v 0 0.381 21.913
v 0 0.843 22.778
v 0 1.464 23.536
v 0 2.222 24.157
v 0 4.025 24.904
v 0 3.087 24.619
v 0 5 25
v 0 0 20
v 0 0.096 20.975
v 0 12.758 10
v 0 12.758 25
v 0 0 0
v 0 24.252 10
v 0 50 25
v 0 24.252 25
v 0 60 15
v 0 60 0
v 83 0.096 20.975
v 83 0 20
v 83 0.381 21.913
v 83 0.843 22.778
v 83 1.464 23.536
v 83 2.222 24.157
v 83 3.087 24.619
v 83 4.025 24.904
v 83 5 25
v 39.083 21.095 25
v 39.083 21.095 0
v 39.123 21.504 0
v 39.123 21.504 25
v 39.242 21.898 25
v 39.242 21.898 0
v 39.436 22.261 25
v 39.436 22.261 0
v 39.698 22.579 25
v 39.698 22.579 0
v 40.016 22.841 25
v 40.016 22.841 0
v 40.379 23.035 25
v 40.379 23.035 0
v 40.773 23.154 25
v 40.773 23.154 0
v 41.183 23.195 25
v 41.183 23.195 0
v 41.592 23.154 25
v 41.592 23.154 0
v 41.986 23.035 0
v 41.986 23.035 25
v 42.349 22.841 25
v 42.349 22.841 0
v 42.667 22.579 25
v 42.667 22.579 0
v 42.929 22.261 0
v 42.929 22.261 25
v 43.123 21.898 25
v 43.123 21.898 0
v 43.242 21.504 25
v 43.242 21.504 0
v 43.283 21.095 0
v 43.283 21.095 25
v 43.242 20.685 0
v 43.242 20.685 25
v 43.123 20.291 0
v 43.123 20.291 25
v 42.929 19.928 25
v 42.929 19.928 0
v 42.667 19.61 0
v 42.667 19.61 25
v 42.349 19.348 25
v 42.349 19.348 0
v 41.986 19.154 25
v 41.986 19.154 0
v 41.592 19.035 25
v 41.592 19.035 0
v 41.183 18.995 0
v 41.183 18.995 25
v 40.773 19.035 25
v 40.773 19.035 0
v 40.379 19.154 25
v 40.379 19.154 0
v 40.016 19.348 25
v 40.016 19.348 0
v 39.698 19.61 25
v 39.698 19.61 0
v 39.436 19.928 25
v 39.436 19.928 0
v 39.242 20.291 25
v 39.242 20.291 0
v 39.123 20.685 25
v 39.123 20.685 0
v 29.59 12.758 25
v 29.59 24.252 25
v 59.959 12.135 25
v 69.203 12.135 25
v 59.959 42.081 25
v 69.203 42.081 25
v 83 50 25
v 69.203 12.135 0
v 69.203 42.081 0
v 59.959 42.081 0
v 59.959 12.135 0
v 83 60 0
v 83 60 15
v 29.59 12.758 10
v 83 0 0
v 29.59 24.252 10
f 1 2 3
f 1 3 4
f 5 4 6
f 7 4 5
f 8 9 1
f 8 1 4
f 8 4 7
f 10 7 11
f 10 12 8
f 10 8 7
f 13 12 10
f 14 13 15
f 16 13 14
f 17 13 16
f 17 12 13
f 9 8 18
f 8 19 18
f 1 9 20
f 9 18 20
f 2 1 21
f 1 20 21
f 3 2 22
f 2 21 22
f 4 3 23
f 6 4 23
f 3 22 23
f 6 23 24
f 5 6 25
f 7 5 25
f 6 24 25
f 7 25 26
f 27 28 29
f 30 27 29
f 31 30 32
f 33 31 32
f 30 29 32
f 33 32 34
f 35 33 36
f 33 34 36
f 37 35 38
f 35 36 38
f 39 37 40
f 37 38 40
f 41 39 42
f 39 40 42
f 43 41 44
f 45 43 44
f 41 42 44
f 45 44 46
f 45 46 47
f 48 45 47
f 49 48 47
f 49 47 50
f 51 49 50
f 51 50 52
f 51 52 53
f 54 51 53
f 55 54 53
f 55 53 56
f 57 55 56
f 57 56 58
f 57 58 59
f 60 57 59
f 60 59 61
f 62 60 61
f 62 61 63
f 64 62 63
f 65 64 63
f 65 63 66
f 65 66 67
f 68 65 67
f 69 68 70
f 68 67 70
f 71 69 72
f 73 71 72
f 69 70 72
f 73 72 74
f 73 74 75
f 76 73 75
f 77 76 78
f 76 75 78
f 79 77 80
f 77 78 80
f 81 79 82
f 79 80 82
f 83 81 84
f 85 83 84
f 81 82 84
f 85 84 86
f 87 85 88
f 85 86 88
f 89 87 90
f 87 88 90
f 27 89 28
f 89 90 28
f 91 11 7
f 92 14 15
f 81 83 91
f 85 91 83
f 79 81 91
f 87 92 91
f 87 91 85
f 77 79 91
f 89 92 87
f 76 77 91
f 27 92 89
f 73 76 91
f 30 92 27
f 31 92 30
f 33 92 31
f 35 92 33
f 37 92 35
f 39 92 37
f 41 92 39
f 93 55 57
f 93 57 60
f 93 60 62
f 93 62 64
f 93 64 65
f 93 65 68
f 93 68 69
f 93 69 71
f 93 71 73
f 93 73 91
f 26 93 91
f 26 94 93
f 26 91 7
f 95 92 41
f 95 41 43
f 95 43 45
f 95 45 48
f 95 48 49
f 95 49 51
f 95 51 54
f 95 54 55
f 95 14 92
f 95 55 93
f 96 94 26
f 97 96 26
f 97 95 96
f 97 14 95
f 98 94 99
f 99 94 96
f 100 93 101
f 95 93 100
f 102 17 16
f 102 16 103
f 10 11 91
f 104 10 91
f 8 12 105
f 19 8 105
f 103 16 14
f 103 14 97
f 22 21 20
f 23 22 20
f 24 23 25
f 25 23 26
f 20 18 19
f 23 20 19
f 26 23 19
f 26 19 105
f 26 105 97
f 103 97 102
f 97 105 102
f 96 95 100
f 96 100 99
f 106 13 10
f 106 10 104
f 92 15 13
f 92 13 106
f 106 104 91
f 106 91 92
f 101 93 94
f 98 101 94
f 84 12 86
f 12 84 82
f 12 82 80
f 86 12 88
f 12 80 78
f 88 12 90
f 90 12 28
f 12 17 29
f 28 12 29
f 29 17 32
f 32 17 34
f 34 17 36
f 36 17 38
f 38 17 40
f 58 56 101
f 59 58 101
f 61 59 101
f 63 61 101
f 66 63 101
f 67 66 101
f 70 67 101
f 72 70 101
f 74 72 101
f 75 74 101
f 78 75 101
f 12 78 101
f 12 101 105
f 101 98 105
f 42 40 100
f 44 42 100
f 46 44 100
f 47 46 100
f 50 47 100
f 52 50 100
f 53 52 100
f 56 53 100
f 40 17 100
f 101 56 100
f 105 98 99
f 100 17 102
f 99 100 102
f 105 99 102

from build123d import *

# Parameters (mm, degrees)
F0_W     = 83
F0_H     = 60
F1_DEPTH = 25
F2_R     = 5
F3_SIZE  = 10
F5_D     = 4.2
F6_W     = 9.244158864
F6_H     = 29.9456948414
F7_DEPTH = 30
F8_W     = 29.5899156481
F8_H     = 11.4948265254
F9_DEPTH = 15


with BuildPart() as f1:
    # F0 (on Top) → F1 (new body)
    with BuildSketch(Plane.XY):
        with Locations((41.5, 30)):
            Rectangle(F0_W, F0_H)
    extrude(amount=F1_DEPTH)

    # F2
    f2_edges = [f1.edges().sort_by_distance(p)[0] for p in [
        (41.5, 0, 25),
    ]]
    fillet(f2_edges, radius=F2_R)

    # F3
    f3_edges = [f1.edges().sort_by_distance(p)[0] for p in [
        (41.5, 60, 25),
    ]]
    chamfer(f3_edges, length=F3_SIZE)

    # F5 (through all)
    with Locations(Plane.XY.offset(25)):
        with Locations((41.1825105548, 21.0945475847)):
            Hole(F5_D / 2)

    # F6 (on face) → F7 (cut)
    with BuildSketch(Plane.XY.offset(25)):
        with Locations((64.5809471607, 27.1079088561)):
            Rectangle(F6_W, F6_H)
    extrude(amount=-F7_DEPTH, mode=Mode.SUBTRACT)

    # F8 (on face) → F9 (cut)
    with BuildSketch(Plane.XY.offset(25)):
        with Locations((14.7949578241, 18.5050182045)):
            Rectangle(F8_W, F8_H)
    extrude(amount=-F9_DEPTH, mode=Mode.SUBTRACT)


solid = f1.part
